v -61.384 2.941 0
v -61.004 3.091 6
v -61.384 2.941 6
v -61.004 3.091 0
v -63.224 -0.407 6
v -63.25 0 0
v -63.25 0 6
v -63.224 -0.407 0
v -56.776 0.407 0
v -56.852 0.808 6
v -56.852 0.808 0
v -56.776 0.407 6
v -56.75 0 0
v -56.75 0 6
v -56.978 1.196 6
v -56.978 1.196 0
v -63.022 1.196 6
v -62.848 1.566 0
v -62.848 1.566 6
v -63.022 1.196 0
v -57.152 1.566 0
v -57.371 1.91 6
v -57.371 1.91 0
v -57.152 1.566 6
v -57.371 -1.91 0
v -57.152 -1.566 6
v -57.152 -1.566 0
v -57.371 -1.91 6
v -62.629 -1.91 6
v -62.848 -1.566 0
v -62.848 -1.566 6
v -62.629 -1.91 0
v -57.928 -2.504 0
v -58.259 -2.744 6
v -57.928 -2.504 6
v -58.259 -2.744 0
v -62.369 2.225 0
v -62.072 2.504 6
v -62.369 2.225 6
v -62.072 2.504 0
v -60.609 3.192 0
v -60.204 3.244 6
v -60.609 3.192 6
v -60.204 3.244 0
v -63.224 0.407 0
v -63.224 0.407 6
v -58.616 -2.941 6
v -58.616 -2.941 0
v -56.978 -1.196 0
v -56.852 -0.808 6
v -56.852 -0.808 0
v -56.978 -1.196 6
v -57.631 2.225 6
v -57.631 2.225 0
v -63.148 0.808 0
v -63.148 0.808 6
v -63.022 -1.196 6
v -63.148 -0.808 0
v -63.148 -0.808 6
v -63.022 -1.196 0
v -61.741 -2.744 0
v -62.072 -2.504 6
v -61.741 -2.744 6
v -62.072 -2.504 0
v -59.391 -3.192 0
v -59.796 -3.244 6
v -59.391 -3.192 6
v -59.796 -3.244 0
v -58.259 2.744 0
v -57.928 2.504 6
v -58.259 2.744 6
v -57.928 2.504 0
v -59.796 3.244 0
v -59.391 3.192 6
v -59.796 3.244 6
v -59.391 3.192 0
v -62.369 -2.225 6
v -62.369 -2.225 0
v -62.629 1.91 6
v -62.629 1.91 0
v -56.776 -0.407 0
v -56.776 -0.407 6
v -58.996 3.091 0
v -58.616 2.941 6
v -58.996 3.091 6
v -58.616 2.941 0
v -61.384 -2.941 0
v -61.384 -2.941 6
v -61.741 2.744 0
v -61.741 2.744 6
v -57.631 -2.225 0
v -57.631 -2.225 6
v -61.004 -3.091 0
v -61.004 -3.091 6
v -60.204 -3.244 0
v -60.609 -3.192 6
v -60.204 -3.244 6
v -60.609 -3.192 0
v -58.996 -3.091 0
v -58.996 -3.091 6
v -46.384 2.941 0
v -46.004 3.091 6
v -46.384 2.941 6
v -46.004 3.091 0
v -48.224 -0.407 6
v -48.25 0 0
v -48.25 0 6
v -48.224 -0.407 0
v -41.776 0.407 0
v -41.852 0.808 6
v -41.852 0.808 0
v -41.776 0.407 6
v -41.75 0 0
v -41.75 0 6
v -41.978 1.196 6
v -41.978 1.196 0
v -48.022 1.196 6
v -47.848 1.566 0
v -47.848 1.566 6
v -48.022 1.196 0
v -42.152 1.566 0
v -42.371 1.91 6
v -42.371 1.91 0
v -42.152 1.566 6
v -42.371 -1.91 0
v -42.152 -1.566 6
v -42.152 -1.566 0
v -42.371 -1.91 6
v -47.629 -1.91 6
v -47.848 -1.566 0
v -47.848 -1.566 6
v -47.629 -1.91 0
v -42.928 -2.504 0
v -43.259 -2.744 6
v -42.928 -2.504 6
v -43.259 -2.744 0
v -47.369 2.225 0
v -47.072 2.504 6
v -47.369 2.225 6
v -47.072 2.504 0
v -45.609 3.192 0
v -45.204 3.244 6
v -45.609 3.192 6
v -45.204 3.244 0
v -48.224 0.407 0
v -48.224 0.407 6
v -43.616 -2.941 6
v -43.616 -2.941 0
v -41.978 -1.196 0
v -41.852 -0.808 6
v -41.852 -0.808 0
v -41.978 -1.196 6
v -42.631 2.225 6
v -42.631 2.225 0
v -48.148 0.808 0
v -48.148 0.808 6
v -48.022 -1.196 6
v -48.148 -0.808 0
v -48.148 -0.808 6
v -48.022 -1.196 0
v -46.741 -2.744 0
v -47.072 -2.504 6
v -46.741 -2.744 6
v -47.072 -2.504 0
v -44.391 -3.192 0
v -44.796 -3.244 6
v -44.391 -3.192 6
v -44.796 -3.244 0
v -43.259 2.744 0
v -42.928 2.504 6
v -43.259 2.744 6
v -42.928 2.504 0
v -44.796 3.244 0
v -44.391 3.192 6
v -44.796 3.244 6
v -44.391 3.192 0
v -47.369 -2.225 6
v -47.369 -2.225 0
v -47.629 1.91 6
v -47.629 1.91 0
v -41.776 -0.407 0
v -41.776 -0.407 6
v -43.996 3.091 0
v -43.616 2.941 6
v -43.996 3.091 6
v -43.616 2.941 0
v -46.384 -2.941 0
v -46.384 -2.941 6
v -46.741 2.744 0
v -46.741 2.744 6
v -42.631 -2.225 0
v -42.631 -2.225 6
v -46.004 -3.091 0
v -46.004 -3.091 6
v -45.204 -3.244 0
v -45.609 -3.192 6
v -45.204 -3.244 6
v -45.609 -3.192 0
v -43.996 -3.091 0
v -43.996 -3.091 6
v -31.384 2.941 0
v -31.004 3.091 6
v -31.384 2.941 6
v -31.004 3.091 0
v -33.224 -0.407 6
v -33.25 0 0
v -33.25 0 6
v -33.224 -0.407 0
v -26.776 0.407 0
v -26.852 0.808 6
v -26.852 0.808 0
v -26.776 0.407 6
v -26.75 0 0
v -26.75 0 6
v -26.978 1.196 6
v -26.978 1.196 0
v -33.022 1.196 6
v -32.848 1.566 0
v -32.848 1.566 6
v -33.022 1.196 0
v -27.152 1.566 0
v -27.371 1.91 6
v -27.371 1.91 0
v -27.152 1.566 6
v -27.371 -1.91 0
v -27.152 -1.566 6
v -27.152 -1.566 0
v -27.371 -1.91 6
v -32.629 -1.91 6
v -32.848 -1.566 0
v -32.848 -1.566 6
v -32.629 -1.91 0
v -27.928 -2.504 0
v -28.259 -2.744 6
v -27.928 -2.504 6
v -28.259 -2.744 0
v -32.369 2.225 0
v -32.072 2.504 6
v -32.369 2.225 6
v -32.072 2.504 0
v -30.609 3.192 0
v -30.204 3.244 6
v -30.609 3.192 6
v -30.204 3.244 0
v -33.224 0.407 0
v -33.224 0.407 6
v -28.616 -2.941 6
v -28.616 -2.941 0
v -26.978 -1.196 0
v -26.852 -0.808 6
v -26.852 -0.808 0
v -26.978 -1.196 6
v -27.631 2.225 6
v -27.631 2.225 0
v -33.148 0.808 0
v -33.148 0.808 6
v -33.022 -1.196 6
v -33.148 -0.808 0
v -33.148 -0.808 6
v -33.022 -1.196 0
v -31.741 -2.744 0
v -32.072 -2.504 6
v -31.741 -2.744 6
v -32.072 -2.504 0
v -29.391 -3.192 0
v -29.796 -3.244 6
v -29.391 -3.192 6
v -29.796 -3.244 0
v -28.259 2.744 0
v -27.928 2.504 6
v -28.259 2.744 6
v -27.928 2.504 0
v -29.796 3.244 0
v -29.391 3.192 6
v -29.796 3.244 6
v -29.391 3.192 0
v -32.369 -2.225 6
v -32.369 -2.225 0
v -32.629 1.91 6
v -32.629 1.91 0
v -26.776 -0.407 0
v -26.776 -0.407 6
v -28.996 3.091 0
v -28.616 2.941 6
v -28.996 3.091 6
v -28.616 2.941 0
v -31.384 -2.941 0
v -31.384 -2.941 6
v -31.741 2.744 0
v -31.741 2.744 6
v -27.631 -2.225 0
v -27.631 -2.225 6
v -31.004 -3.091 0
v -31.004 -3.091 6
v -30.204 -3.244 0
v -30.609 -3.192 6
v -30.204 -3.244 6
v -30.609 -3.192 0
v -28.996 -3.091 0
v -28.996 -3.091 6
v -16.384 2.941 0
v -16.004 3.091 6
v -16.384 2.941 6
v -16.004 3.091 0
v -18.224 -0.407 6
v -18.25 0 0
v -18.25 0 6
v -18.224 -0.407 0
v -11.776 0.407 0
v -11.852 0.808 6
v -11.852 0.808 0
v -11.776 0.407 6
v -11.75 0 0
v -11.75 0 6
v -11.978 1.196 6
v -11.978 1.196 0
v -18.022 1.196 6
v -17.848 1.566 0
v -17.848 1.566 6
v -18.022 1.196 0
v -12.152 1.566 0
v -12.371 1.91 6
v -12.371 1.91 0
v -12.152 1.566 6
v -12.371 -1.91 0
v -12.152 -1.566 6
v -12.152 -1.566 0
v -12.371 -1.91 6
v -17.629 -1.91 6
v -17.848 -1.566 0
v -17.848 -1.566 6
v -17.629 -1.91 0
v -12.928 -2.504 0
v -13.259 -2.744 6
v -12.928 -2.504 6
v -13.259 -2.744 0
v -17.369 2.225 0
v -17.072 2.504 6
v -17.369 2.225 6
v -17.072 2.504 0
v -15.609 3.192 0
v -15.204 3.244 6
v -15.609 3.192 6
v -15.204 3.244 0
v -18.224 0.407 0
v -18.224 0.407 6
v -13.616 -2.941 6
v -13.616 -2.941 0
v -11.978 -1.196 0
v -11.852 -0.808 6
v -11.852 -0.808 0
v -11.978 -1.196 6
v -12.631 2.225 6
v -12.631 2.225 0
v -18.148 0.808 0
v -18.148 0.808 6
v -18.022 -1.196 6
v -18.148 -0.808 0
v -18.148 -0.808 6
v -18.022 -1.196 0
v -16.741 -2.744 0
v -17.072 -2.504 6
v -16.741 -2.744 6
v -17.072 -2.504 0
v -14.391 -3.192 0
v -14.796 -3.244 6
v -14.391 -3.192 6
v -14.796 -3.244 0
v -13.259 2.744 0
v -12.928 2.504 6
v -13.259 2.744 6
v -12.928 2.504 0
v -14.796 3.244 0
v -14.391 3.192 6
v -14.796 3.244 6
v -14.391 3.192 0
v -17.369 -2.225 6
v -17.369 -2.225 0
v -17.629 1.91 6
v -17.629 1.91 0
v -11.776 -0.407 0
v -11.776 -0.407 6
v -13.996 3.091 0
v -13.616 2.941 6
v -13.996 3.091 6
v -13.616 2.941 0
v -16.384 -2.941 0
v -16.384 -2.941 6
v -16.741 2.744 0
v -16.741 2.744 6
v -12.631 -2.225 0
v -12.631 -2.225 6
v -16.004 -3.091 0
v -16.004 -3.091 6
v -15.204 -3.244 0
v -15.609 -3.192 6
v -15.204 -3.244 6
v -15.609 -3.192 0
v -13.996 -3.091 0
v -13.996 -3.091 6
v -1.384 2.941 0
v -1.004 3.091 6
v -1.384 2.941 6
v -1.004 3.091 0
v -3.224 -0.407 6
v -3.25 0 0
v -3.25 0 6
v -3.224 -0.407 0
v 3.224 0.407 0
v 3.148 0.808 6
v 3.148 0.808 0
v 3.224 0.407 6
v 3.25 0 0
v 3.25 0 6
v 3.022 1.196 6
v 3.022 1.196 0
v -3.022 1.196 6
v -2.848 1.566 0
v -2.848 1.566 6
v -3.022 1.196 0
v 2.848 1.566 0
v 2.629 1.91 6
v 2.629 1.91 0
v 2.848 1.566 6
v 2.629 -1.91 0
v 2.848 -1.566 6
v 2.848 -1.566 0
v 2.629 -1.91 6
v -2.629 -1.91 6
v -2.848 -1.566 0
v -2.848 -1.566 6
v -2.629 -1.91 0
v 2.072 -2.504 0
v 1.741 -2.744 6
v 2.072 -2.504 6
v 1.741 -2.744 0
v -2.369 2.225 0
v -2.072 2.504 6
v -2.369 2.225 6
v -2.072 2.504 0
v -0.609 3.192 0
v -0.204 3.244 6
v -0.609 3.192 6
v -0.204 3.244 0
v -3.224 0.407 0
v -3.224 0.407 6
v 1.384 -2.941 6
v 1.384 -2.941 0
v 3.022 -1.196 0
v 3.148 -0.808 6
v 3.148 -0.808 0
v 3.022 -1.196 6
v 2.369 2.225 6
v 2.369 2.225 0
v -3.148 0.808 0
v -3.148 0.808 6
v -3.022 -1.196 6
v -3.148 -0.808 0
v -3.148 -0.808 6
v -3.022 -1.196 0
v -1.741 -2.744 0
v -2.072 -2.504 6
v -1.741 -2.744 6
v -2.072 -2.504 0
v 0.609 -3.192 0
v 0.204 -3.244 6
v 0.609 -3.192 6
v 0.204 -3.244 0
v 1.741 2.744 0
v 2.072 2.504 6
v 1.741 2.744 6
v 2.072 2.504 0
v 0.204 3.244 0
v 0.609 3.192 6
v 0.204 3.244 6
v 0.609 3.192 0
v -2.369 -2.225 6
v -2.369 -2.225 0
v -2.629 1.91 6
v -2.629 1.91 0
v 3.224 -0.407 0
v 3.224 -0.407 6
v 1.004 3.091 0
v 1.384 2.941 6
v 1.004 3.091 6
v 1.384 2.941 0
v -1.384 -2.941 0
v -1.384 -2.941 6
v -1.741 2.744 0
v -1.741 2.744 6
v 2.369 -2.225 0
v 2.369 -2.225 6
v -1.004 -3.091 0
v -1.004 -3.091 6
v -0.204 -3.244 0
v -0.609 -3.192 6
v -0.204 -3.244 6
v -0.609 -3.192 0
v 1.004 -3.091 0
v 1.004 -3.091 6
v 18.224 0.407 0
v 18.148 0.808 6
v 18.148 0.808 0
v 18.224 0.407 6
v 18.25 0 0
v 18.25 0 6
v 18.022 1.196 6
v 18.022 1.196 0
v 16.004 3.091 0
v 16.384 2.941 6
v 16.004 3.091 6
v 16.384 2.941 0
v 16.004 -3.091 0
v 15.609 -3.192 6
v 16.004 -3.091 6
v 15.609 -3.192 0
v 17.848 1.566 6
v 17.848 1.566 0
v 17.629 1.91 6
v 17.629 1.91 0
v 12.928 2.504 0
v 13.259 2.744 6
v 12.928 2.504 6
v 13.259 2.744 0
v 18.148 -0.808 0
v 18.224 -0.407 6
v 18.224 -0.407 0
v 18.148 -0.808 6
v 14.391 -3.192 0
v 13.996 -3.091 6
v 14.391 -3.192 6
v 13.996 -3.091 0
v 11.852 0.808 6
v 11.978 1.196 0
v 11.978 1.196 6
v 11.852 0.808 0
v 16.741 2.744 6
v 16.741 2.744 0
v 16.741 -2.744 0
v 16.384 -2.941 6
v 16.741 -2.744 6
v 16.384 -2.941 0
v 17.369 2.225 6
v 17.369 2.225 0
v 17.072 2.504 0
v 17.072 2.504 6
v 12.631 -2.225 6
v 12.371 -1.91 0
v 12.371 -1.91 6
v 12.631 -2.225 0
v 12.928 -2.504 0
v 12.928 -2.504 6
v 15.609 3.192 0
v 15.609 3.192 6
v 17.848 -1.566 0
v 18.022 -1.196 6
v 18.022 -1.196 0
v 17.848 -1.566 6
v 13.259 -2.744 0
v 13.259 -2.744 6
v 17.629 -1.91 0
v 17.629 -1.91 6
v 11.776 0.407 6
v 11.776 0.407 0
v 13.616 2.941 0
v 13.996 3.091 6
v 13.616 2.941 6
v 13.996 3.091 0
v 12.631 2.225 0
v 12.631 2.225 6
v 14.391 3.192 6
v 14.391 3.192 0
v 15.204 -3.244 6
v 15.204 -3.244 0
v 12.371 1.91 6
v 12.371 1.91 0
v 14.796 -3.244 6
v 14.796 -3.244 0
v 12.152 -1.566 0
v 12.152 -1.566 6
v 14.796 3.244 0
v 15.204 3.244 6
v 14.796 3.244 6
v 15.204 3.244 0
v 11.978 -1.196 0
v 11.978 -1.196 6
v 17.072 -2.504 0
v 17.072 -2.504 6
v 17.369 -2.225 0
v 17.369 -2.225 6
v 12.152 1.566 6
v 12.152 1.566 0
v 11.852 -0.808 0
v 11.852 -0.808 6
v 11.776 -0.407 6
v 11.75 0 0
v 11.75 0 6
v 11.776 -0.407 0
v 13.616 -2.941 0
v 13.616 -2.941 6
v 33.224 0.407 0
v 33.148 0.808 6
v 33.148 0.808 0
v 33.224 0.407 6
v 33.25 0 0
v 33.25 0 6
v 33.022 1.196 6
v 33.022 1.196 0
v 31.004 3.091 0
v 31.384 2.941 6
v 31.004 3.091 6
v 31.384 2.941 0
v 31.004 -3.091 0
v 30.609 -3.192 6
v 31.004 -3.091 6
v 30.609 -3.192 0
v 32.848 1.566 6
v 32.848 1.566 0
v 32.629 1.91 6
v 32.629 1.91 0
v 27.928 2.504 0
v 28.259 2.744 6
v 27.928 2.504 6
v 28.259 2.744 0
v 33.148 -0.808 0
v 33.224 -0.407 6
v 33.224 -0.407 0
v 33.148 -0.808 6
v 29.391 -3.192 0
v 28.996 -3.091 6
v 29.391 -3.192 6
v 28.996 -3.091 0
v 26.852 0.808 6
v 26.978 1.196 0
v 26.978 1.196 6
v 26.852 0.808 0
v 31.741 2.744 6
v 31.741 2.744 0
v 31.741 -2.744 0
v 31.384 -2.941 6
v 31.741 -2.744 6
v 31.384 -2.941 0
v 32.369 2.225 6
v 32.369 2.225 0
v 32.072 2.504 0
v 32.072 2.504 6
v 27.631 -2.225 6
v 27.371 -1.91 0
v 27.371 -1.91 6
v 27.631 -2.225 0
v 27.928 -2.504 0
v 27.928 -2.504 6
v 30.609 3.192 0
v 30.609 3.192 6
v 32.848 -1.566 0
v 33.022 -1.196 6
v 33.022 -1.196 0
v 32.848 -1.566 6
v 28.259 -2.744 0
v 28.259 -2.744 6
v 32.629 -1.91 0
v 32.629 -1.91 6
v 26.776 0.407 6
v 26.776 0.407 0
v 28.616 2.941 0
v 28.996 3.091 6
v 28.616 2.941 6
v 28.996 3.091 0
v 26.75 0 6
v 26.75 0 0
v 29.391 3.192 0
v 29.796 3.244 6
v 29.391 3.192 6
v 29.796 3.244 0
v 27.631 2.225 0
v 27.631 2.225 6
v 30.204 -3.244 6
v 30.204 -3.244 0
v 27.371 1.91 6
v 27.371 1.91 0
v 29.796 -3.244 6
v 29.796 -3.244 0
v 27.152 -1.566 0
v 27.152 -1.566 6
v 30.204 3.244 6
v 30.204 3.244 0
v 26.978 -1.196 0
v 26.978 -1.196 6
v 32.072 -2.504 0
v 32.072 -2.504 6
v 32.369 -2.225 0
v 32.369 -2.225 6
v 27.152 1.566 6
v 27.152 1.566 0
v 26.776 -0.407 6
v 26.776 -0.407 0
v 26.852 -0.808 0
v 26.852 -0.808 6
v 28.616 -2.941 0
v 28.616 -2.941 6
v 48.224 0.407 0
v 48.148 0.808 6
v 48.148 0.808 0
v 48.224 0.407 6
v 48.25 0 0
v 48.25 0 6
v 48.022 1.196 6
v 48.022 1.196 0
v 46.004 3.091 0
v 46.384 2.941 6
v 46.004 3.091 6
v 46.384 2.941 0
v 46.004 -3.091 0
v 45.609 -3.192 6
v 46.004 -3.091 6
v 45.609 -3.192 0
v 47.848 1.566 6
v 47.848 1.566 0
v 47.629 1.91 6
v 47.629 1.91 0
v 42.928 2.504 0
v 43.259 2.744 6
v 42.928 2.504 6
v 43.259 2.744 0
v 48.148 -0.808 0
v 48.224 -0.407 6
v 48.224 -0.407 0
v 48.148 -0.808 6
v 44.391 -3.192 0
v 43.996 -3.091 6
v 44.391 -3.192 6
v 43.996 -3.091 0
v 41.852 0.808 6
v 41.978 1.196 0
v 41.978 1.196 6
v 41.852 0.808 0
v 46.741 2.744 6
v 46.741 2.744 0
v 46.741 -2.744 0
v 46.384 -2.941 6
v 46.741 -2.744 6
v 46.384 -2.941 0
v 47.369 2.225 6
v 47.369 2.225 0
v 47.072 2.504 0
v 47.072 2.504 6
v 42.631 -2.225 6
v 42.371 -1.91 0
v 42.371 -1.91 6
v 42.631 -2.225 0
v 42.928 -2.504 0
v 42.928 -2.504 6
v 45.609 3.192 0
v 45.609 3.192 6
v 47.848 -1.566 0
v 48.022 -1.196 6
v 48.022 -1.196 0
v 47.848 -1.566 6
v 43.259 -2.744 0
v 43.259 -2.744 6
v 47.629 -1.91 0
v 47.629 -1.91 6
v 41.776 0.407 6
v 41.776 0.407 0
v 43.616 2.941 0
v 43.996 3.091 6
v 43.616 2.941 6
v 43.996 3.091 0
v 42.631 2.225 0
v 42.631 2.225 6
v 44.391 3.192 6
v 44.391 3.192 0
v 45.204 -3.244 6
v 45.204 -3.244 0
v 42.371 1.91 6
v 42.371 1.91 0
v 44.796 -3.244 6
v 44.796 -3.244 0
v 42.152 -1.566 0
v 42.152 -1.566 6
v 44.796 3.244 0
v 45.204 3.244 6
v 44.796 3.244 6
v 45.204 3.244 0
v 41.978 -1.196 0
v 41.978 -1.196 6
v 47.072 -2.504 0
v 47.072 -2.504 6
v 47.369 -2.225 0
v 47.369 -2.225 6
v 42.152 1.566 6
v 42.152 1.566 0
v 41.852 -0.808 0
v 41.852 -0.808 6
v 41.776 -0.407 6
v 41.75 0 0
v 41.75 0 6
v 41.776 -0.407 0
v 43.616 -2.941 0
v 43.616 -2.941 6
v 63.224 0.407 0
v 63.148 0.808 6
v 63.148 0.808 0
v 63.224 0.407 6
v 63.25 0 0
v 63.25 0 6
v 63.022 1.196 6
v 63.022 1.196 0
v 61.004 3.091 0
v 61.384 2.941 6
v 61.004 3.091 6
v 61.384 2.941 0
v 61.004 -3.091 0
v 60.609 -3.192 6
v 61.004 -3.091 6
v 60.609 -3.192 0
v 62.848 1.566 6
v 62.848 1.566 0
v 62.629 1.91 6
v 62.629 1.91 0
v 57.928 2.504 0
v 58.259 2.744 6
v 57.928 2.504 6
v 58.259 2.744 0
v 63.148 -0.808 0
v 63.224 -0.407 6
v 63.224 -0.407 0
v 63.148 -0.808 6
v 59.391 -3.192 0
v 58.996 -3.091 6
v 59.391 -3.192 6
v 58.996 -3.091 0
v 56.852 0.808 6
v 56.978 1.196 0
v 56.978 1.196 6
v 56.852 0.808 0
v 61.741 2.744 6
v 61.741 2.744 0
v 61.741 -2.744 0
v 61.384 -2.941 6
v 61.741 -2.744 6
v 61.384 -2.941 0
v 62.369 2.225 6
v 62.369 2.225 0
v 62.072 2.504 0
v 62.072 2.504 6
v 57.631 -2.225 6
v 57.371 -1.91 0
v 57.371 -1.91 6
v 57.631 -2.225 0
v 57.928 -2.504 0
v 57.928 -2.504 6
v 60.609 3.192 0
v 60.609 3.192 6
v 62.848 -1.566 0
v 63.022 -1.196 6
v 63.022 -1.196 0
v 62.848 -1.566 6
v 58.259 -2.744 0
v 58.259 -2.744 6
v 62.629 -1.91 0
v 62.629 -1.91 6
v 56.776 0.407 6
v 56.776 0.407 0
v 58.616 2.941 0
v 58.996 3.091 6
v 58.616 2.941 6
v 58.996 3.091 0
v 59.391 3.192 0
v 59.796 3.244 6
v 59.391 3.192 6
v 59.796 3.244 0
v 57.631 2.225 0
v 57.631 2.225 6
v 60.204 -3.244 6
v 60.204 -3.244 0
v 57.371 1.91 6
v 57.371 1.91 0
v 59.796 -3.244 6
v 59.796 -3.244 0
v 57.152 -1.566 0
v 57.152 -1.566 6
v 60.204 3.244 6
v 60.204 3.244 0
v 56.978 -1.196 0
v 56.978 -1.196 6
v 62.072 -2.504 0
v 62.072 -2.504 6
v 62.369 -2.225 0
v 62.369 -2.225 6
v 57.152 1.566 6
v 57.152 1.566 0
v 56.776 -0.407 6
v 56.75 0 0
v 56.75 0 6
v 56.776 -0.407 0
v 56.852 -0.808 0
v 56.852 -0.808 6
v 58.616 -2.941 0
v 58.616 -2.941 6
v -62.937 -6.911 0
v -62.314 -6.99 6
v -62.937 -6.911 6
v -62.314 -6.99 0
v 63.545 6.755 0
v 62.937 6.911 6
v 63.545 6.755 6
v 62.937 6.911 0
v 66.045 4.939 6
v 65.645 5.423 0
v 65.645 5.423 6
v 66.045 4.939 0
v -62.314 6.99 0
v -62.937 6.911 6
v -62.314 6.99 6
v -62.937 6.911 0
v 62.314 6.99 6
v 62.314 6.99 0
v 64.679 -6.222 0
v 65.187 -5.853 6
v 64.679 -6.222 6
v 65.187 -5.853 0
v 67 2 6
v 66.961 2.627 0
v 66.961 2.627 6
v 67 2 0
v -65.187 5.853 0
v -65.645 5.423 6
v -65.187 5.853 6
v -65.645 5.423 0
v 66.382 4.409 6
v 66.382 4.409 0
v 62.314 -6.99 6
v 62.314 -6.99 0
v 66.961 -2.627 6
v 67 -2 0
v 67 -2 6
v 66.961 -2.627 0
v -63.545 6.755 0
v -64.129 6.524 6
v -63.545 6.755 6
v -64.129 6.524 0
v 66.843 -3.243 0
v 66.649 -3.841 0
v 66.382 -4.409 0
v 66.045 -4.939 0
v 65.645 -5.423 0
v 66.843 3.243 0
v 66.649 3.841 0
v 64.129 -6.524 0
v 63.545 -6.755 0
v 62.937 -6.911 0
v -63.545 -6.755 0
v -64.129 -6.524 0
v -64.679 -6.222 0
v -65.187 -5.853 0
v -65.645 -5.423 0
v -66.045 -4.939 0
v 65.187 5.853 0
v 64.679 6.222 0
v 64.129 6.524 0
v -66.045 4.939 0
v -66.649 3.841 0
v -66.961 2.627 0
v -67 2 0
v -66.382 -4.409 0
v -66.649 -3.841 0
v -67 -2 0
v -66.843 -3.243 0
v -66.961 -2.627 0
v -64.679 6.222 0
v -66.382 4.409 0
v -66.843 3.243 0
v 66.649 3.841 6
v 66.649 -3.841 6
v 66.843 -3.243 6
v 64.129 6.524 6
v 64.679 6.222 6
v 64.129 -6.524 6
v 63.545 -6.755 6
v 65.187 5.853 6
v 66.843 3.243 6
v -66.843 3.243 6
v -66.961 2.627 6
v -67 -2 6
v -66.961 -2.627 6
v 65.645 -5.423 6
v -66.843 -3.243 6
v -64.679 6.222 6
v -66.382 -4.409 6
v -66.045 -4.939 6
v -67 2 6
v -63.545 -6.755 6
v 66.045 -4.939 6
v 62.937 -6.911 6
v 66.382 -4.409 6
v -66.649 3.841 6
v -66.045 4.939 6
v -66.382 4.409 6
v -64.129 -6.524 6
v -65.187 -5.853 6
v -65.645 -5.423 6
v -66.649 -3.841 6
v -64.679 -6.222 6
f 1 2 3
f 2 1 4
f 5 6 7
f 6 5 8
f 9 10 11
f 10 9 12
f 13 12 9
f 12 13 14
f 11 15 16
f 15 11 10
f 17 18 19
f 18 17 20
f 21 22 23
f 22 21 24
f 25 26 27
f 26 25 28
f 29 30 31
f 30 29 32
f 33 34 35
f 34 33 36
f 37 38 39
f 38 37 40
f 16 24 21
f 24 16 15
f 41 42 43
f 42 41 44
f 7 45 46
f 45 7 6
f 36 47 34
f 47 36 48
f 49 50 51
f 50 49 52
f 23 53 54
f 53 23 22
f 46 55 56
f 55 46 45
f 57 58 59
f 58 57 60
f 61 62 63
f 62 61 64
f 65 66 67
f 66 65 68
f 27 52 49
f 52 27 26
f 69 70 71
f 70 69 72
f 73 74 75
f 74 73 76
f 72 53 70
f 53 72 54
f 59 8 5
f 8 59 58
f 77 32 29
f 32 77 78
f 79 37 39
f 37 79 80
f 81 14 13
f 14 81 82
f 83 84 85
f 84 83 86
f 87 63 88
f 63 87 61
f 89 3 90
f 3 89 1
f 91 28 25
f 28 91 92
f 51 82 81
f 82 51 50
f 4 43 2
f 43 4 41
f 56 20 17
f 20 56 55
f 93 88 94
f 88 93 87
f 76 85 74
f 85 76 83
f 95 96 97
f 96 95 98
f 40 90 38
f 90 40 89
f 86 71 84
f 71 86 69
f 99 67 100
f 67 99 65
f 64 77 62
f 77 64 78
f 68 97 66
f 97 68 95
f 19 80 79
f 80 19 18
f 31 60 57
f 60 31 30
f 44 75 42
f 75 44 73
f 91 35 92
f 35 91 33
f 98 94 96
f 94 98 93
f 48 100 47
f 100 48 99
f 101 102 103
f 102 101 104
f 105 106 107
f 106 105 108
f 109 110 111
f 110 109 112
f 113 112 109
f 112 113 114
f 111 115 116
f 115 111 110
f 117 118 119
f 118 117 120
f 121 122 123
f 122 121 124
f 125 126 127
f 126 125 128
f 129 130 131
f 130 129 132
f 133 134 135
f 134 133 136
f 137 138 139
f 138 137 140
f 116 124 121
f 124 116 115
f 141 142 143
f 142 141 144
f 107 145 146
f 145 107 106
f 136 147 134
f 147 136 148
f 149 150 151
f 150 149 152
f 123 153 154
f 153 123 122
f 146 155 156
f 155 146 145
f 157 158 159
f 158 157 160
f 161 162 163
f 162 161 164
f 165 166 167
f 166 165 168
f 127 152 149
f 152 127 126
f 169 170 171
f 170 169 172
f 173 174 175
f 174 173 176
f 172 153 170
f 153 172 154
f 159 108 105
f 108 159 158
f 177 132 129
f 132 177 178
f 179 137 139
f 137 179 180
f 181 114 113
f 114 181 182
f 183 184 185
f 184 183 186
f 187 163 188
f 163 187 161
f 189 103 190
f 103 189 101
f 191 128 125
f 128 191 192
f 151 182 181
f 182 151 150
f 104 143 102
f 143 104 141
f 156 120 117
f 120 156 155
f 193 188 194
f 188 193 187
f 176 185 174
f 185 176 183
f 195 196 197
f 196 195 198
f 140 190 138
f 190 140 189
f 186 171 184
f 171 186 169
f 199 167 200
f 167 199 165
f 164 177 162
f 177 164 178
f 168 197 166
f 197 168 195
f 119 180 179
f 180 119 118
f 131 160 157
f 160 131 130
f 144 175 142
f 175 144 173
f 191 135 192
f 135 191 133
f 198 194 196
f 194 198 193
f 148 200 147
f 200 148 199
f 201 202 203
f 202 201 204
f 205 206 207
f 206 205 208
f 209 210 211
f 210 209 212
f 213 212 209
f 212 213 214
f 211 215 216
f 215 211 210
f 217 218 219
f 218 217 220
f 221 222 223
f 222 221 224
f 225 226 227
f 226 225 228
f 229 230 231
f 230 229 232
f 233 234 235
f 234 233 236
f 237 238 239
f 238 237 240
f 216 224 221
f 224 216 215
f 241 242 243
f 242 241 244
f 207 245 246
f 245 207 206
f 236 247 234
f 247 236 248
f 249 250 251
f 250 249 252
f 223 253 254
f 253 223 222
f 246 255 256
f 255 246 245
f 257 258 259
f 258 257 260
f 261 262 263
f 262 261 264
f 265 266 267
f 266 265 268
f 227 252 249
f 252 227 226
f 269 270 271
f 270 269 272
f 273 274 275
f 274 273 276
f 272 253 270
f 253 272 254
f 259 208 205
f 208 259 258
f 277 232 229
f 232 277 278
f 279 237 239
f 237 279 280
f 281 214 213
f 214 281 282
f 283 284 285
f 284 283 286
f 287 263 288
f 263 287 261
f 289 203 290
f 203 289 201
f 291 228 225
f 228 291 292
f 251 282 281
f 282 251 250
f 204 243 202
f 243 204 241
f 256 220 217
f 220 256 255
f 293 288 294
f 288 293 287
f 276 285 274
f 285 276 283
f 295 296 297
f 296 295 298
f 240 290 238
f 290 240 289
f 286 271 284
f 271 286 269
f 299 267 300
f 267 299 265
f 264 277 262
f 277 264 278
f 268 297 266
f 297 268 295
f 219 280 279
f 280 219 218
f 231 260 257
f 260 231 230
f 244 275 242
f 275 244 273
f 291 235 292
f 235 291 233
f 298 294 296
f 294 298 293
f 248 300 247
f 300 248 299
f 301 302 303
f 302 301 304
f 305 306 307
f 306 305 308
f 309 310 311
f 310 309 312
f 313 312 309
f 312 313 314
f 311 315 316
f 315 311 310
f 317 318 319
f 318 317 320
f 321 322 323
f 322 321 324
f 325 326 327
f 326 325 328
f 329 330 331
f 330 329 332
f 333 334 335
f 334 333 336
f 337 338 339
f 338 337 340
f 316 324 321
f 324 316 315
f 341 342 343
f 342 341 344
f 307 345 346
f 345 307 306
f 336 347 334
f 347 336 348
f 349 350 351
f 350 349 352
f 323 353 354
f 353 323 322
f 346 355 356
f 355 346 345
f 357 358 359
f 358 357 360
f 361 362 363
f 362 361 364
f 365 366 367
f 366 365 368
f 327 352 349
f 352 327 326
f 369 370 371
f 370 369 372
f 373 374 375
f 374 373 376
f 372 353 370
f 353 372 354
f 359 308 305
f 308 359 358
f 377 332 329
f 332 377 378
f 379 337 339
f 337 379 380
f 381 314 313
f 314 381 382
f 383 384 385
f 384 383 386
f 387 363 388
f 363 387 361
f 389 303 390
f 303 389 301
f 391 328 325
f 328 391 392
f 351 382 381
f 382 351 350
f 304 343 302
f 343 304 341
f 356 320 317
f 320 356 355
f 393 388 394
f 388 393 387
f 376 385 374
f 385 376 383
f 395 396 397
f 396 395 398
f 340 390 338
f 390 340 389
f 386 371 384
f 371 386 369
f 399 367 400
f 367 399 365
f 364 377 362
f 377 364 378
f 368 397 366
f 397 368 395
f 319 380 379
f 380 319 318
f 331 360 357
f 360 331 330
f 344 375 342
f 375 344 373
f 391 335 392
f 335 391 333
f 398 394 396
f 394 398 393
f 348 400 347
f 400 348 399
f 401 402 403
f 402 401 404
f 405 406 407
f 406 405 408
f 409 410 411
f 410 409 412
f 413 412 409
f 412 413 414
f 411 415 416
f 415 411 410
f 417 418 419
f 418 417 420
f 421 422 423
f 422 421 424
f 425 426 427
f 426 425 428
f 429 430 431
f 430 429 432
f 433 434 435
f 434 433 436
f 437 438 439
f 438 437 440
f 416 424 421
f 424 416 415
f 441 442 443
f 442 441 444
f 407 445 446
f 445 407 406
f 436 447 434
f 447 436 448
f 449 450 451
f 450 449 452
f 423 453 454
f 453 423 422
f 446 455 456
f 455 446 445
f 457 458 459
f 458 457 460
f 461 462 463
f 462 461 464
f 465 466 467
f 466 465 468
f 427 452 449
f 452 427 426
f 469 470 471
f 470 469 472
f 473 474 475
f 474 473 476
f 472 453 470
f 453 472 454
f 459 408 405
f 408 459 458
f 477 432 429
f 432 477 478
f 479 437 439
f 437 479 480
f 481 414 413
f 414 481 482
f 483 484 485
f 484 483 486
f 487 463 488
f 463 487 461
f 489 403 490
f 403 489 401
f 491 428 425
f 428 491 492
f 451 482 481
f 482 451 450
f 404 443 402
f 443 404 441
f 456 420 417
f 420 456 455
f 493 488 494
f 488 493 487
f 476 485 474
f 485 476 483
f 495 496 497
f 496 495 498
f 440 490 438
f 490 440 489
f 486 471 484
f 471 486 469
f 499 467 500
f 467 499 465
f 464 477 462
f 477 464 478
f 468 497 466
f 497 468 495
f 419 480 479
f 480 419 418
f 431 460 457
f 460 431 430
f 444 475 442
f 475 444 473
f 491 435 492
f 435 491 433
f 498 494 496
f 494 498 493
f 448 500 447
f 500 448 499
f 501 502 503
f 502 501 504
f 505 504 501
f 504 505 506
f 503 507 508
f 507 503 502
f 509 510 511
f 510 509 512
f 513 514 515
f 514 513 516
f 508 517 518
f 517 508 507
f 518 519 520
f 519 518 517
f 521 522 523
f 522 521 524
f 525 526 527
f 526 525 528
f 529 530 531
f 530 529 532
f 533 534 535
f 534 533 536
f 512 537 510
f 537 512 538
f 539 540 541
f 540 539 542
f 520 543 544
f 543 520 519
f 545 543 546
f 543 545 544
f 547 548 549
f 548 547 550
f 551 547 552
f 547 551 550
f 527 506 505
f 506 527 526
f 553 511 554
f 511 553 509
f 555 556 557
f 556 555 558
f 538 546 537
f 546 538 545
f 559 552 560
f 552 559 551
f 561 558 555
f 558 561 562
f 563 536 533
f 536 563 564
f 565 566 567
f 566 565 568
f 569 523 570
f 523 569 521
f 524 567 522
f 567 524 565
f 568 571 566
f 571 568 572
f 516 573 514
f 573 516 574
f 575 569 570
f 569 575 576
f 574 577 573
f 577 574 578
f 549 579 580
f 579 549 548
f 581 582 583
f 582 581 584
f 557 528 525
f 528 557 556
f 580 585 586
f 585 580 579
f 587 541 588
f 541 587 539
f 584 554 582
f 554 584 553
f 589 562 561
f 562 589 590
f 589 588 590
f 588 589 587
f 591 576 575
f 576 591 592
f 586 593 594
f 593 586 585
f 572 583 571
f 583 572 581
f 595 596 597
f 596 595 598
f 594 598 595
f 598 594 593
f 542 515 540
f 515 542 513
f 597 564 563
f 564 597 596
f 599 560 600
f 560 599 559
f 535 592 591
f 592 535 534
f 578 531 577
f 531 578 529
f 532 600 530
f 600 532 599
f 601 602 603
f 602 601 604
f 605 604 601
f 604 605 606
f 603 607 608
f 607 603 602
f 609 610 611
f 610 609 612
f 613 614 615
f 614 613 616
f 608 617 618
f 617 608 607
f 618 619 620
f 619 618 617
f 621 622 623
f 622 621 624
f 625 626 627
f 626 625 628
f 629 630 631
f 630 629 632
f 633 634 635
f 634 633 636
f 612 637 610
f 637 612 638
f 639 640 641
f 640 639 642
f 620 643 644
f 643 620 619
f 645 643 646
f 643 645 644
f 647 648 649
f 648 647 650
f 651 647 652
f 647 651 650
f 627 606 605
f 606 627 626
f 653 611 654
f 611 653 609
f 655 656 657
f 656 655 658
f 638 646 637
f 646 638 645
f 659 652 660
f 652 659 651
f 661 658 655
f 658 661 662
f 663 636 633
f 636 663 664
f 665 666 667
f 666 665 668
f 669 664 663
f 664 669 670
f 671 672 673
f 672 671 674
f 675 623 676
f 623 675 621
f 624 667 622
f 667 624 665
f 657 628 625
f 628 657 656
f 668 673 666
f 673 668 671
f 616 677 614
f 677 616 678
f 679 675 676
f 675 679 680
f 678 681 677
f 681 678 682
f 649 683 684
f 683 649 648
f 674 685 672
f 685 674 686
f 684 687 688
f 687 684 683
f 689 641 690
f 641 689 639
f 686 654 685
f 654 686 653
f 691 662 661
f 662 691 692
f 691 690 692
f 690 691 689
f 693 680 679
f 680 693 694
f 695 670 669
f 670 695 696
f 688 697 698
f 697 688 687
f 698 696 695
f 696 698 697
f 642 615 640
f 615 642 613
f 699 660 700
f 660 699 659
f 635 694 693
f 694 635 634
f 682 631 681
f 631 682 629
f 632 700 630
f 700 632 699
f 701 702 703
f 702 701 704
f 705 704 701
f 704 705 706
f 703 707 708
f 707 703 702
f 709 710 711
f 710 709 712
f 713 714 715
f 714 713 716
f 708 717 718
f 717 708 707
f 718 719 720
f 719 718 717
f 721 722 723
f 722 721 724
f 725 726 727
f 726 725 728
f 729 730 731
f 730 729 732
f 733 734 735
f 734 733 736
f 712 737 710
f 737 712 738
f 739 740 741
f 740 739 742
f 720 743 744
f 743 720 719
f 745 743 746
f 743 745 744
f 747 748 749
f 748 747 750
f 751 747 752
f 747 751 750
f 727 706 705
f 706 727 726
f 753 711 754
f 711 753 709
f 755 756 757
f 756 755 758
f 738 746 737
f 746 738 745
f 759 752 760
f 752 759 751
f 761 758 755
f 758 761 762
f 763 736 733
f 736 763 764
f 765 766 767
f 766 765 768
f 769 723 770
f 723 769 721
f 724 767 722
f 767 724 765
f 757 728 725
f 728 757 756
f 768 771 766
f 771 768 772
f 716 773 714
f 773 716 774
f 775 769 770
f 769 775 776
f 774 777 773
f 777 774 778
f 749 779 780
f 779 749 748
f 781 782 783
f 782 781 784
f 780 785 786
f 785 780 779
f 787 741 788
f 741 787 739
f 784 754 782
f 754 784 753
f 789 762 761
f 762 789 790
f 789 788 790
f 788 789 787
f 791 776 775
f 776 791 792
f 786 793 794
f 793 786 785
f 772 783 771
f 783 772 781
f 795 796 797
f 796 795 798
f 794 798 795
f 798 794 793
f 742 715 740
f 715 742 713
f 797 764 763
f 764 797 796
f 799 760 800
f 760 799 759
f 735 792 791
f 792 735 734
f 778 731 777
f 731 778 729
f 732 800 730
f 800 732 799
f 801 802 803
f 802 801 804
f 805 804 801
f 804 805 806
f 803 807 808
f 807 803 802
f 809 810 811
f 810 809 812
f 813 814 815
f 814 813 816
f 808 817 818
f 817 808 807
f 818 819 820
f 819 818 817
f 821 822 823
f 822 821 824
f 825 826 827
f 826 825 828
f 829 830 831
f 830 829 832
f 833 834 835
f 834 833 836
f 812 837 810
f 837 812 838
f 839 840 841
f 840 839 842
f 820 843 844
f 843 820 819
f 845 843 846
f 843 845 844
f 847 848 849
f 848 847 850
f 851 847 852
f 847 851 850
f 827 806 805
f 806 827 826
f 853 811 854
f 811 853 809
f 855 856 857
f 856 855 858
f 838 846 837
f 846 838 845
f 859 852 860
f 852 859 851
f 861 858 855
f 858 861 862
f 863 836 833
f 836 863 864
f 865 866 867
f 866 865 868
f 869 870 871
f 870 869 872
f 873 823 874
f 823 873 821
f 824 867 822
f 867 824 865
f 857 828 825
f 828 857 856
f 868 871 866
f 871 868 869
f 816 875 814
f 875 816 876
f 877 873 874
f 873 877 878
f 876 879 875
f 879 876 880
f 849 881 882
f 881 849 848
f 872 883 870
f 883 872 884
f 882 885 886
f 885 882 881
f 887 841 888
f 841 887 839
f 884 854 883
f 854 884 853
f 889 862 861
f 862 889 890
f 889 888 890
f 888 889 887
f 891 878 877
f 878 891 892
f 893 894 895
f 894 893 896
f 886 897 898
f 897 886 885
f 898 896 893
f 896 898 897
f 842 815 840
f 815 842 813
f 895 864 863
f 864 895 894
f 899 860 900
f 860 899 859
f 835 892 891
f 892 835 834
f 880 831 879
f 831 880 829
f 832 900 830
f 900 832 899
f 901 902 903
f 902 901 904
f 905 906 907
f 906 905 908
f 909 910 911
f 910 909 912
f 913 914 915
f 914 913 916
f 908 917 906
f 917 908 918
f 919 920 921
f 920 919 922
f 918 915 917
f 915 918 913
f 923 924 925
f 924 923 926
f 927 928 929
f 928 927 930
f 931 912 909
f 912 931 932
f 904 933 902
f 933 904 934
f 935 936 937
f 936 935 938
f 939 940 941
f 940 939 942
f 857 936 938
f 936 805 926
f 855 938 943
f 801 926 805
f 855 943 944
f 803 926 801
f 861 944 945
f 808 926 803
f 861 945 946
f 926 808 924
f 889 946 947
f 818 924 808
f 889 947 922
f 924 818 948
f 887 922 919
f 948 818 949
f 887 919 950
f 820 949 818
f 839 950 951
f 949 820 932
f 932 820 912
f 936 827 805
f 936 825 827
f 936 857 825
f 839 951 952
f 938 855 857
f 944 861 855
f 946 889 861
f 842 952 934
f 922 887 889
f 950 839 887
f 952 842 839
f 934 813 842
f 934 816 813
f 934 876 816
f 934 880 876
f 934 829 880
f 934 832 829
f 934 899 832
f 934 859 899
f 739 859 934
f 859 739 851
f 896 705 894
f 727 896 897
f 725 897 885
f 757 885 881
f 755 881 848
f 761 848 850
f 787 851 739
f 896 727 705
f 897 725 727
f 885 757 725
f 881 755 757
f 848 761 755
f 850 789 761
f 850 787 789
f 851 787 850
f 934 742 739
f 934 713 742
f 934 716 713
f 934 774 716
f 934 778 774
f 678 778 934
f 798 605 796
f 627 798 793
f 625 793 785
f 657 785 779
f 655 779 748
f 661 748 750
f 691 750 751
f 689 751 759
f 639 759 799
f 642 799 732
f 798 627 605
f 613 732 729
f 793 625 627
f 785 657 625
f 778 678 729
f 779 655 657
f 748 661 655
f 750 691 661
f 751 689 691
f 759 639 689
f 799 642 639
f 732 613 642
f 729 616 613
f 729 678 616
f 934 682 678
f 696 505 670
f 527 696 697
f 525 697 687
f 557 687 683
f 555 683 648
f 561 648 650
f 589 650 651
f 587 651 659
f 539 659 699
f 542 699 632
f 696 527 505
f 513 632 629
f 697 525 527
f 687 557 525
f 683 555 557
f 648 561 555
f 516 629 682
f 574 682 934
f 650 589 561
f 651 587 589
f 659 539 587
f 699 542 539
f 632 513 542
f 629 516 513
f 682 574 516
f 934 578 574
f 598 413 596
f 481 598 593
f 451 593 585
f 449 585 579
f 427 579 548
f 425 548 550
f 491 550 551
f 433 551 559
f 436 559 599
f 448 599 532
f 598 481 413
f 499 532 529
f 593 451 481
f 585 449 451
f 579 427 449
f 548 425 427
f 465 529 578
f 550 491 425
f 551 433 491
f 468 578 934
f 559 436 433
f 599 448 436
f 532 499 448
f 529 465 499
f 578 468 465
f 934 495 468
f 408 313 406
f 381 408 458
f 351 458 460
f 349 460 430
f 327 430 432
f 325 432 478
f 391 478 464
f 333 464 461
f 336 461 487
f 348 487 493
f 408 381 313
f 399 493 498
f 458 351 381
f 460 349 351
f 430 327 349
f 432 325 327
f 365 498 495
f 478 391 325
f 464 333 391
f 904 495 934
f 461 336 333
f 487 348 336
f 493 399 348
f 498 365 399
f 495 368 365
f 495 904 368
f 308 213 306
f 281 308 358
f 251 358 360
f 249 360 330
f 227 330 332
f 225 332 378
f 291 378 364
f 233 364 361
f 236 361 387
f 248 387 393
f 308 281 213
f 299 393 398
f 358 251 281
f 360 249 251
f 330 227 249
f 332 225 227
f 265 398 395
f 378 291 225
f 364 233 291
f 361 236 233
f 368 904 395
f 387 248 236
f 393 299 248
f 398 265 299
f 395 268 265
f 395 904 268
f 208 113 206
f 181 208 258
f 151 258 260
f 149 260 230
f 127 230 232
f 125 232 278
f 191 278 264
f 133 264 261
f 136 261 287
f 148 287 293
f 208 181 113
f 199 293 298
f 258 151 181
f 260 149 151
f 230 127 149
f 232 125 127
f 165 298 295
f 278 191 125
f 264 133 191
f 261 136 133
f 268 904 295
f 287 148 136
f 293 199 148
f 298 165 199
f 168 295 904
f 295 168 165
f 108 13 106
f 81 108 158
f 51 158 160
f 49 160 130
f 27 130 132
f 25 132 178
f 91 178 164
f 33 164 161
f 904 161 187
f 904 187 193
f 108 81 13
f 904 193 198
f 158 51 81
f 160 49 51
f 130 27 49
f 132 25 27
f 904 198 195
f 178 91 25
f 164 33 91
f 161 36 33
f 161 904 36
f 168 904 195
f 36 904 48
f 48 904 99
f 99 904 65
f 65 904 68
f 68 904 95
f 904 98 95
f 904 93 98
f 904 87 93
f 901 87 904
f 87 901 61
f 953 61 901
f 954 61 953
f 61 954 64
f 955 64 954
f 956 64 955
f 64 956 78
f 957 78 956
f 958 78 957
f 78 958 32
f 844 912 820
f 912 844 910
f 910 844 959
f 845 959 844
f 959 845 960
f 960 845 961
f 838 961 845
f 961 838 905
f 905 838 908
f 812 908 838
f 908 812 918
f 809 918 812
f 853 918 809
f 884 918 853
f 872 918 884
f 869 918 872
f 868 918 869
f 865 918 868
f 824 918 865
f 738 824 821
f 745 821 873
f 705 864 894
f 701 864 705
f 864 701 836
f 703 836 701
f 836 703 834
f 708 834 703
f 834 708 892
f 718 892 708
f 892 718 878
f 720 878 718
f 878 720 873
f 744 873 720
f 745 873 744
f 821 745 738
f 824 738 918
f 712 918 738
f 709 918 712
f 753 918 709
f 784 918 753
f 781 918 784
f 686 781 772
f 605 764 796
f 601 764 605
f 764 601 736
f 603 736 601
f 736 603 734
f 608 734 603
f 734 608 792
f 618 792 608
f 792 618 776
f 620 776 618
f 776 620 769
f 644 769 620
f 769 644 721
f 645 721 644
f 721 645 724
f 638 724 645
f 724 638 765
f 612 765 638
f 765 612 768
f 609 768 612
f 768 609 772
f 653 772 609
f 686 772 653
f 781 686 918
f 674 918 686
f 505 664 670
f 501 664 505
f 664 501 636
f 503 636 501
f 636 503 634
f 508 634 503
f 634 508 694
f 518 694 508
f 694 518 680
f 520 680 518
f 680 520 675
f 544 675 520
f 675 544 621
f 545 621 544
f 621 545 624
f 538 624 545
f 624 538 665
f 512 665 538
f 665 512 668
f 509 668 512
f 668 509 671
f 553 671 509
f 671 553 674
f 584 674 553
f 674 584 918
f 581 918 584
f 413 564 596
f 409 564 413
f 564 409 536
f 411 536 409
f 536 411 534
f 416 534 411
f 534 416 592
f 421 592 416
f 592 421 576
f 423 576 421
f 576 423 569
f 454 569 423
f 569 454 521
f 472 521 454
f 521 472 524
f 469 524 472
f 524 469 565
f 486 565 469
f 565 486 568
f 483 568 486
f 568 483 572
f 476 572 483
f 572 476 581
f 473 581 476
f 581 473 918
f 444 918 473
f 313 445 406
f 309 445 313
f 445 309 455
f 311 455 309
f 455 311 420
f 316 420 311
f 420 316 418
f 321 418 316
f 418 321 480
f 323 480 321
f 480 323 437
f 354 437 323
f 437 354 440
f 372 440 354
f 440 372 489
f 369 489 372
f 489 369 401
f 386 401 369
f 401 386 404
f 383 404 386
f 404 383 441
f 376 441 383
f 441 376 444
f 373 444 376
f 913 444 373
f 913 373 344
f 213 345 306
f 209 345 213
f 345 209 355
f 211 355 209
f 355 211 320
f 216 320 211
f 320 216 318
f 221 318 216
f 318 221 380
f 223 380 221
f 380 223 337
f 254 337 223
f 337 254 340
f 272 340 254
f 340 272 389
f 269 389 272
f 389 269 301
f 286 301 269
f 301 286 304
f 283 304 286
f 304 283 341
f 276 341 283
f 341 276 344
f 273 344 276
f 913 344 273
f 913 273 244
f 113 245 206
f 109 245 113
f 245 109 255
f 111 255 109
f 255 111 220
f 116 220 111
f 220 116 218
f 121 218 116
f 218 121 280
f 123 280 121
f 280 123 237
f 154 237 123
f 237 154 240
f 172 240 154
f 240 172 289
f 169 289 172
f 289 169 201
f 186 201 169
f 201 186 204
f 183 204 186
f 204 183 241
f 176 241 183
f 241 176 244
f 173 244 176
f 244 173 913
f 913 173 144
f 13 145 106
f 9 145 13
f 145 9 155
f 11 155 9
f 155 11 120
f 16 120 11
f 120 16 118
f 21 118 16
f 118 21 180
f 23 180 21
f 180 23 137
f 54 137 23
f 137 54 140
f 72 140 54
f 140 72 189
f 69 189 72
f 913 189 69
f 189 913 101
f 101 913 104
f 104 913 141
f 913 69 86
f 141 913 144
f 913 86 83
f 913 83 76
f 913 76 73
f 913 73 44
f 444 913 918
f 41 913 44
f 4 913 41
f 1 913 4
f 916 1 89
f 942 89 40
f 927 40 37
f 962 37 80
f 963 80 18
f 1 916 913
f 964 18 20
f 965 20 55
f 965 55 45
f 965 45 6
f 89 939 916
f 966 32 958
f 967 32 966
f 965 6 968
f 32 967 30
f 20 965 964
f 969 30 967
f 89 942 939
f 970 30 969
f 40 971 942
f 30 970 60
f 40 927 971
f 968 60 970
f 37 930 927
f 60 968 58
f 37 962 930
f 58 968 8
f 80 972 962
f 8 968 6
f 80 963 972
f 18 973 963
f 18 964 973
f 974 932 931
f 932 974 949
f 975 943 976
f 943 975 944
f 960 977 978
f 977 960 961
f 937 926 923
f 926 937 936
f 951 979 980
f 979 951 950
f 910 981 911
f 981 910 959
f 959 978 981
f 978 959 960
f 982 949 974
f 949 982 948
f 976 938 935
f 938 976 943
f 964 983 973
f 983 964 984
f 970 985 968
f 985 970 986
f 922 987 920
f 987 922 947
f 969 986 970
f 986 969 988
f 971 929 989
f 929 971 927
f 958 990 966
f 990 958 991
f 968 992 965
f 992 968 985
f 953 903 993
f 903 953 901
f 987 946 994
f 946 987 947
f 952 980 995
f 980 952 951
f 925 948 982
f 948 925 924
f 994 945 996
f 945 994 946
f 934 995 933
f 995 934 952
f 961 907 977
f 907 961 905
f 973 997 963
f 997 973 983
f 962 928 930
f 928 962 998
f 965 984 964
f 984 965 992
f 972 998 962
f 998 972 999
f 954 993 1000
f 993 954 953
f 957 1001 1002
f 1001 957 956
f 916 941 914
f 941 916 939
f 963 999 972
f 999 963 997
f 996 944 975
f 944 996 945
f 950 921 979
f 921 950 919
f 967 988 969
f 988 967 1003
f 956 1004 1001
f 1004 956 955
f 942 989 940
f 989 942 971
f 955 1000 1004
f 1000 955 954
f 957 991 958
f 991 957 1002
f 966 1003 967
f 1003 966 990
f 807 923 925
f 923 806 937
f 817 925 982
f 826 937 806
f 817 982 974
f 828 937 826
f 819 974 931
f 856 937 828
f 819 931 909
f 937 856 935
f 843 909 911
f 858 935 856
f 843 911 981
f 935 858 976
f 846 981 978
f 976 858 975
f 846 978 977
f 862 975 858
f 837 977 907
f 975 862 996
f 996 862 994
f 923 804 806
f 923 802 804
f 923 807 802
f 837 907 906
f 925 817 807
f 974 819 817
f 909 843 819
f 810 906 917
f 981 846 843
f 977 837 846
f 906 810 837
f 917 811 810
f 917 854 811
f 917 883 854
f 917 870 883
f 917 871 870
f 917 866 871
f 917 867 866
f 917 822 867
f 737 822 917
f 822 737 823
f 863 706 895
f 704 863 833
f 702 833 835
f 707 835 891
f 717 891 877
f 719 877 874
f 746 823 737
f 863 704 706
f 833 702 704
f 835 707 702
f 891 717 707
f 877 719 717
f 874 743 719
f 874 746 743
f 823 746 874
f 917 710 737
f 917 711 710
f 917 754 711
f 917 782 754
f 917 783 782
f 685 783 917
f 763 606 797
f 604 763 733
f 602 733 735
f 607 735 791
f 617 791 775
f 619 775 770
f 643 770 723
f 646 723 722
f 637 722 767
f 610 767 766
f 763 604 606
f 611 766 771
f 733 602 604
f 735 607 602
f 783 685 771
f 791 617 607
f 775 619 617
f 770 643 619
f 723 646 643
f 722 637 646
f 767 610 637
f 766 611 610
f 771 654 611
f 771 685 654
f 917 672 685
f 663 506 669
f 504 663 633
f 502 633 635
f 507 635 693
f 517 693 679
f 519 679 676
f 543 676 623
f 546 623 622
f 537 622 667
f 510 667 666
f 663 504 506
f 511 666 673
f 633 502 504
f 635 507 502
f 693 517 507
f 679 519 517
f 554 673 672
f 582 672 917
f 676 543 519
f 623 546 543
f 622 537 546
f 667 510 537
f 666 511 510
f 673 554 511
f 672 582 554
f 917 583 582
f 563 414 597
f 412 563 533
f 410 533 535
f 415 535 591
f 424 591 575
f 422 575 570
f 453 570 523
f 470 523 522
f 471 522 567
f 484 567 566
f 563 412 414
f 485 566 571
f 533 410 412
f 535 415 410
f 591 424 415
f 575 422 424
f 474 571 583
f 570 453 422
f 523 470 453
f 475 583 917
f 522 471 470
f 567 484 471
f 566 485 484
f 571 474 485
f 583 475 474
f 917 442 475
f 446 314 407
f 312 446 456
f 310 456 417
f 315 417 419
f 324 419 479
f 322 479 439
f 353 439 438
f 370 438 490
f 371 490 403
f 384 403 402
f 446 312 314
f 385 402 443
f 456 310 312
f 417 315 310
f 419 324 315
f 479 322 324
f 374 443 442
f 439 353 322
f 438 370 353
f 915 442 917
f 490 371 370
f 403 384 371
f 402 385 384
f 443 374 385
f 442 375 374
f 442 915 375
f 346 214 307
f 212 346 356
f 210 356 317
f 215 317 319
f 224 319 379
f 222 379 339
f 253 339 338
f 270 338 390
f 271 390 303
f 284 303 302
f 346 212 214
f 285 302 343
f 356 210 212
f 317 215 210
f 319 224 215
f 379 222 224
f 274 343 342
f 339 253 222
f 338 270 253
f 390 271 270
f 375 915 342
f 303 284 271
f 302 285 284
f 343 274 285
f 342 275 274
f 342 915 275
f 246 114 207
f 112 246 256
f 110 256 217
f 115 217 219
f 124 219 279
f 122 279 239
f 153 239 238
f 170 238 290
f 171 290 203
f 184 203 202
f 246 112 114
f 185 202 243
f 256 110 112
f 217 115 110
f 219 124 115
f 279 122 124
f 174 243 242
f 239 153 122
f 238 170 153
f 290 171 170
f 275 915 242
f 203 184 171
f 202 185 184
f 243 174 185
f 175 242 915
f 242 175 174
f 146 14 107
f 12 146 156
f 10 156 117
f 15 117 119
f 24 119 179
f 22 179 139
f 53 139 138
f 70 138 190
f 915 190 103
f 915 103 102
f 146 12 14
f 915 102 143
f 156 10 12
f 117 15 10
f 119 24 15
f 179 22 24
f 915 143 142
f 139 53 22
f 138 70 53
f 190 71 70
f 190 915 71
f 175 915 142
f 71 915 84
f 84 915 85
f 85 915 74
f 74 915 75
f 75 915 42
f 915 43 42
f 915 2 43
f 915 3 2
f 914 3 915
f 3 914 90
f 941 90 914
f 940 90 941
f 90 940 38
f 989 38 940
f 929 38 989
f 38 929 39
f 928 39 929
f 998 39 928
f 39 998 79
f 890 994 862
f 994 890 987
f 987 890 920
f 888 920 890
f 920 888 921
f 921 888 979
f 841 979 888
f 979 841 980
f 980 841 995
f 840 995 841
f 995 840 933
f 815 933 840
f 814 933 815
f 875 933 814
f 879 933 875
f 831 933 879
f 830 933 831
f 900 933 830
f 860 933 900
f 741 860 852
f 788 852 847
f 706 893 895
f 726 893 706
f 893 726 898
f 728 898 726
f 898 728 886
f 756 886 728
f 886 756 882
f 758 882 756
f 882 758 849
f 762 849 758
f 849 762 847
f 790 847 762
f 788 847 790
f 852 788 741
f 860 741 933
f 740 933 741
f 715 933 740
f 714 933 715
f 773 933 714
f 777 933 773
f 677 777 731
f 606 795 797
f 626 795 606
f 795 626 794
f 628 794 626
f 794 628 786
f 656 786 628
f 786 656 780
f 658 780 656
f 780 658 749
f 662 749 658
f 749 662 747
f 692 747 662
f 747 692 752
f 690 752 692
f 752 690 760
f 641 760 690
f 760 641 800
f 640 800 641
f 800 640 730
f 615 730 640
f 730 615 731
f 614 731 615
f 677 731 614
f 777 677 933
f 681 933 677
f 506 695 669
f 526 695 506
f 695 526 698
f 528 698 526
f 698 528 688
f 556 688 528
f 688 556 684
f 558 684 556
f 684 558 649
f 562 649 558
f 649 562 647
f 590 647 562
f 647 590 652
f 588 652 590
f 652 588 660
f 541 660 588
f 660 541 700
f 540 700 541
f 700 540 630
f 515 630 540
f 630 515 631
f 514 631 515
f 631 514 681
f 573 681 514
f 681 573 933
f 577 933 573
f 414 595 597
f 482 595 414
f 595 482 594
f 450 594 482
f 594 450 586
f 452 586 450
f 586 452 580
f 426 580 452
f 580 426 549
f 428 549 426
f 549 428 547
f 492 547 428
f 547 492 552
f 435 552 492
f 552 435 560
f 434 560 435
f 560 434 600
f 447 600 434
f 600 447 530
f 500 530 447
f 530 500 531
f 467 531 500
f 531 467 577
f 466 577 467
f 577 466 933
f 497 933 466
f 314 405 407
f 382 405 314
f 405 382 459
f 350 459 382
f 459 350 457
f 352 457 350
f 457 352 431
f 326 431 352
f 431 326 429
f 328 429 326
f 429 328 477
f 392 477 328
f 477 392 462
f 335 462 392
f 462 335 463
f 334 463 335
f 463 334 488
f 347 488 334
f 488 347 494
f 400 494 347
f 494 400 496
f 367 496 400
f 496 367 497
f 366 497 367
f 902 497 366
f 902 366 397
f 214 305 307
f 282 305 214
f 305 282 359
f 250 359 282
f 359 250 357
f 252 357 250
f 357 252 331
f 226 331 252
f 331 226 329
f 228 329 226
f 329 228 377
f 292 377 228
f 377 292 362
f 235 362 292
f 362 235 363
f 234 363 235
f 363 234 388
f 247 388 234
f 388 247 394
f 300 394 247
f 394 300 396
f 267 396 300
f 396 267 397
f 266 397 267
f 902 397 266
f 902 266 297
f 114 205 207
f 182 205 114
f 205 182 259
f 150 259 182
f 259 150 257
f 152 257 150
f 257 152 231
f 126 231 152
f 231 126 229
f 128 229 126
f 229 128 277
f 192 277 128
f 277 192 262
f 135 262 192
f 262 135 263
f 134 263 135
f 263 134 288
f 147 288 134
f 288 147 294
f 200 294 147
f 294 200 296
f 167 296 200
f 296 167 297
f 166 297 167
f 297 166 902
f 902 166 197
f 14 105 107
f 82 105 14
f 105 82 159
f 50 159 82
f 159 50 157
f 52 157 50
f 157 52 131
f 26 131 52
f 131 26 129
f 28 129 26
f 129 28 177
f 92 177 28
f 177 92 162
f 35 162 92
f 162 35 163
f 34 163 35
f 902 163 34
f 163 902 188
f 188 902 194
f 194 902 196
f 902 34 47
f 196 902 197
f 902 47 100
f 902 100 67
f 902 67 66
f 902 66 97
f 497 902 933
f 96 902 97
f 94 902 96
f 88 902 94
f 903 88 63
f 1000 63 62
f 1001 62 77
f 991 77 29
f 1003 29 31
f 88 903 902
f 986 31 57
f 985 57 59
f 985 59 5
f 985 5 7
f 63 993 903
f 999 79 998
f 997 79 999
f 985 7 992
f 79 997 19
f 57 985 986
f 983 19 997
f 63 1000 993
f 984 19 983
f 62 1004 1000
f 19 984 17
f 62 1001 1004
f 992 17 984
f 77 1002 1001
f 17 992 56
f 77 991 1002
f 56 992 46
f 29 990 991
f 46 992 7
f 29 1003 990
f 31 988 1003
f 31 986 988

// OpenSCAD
$fn = 50;


difference() {
	union() {
		hull() {
			translate(v = [-62.0000000000, 2.0000000000, 0]) {
				cylinder(h = 6, r = 5);
			}
			translate(v = [62.0000000000, 2.0000000000, 0]) {
				cylinder(h = 6, r = 5);
			}
			translate(v = [-62.0000000000, -2.0000000000, 0]) {
				cylinder(h = 6, r = 5);
			}
			translate(v = [62.0000000000, -2.0000000000, 0]) {
				cylinder(h = 6, r = 5);
			}
		}
	}
	union() {
		translate(v = [-60.0000000000, 0.0000000000, 0]) {
			translate(v = [0, 0, -100]) {
				cylinder(h = 200, r = 3.2500000000);
			}
		}
		translate(v = [-45.0000000000, 0.0000000000, 0]) {
			translate(v = [0, 0, -100]) {
				cylinder(h = 200, r = 3.2500000000);
			}
		}
		translate(v = [-30.0000000000, 0.0000000000, 0]) {
			translate(v = [0, 0, -100]) {
				cylinder(h = 200, r = 3.2500000000);
			}
		}
		translate(v = [-15.0000000000, 0.0000000000, 0]) {
			translate(v = [0, 0, -100]) {
				cylinder(h = 200, r = 3.2500000000);
			}
		}
		translate(v = [0, 0, -100]) {
			cylinder(h = 200, r = 3.2500000000);
		}
		translate(v = [15.0000000000, 0.0000000000, 0]) {
			translate(v = [0, 0, -100]) {
				cylinder(h = 200, r = 3.2500000000);
			}
		}
		translate(v = [30.0000000000, 0.0000000000, 0]) {
			translate(v = [0, 0, -100]) {
				cylinder(h = 200, r = 3.2500000000);
			}
		}
		translate(v = [45.0000000000, 0.0000000000, 0]) {
			translate(v = [0, 0, -100]) {
				cylinder(h = 200, r = 3.2500000000);
			}
		}
		translate(v = [60.0000000000, 0.0000000000, 0]) {
			translate(v = [0, 0, -100]) {
				cylinder(h = 200, r = 3.2500000000);
			}
		}
	}
}
